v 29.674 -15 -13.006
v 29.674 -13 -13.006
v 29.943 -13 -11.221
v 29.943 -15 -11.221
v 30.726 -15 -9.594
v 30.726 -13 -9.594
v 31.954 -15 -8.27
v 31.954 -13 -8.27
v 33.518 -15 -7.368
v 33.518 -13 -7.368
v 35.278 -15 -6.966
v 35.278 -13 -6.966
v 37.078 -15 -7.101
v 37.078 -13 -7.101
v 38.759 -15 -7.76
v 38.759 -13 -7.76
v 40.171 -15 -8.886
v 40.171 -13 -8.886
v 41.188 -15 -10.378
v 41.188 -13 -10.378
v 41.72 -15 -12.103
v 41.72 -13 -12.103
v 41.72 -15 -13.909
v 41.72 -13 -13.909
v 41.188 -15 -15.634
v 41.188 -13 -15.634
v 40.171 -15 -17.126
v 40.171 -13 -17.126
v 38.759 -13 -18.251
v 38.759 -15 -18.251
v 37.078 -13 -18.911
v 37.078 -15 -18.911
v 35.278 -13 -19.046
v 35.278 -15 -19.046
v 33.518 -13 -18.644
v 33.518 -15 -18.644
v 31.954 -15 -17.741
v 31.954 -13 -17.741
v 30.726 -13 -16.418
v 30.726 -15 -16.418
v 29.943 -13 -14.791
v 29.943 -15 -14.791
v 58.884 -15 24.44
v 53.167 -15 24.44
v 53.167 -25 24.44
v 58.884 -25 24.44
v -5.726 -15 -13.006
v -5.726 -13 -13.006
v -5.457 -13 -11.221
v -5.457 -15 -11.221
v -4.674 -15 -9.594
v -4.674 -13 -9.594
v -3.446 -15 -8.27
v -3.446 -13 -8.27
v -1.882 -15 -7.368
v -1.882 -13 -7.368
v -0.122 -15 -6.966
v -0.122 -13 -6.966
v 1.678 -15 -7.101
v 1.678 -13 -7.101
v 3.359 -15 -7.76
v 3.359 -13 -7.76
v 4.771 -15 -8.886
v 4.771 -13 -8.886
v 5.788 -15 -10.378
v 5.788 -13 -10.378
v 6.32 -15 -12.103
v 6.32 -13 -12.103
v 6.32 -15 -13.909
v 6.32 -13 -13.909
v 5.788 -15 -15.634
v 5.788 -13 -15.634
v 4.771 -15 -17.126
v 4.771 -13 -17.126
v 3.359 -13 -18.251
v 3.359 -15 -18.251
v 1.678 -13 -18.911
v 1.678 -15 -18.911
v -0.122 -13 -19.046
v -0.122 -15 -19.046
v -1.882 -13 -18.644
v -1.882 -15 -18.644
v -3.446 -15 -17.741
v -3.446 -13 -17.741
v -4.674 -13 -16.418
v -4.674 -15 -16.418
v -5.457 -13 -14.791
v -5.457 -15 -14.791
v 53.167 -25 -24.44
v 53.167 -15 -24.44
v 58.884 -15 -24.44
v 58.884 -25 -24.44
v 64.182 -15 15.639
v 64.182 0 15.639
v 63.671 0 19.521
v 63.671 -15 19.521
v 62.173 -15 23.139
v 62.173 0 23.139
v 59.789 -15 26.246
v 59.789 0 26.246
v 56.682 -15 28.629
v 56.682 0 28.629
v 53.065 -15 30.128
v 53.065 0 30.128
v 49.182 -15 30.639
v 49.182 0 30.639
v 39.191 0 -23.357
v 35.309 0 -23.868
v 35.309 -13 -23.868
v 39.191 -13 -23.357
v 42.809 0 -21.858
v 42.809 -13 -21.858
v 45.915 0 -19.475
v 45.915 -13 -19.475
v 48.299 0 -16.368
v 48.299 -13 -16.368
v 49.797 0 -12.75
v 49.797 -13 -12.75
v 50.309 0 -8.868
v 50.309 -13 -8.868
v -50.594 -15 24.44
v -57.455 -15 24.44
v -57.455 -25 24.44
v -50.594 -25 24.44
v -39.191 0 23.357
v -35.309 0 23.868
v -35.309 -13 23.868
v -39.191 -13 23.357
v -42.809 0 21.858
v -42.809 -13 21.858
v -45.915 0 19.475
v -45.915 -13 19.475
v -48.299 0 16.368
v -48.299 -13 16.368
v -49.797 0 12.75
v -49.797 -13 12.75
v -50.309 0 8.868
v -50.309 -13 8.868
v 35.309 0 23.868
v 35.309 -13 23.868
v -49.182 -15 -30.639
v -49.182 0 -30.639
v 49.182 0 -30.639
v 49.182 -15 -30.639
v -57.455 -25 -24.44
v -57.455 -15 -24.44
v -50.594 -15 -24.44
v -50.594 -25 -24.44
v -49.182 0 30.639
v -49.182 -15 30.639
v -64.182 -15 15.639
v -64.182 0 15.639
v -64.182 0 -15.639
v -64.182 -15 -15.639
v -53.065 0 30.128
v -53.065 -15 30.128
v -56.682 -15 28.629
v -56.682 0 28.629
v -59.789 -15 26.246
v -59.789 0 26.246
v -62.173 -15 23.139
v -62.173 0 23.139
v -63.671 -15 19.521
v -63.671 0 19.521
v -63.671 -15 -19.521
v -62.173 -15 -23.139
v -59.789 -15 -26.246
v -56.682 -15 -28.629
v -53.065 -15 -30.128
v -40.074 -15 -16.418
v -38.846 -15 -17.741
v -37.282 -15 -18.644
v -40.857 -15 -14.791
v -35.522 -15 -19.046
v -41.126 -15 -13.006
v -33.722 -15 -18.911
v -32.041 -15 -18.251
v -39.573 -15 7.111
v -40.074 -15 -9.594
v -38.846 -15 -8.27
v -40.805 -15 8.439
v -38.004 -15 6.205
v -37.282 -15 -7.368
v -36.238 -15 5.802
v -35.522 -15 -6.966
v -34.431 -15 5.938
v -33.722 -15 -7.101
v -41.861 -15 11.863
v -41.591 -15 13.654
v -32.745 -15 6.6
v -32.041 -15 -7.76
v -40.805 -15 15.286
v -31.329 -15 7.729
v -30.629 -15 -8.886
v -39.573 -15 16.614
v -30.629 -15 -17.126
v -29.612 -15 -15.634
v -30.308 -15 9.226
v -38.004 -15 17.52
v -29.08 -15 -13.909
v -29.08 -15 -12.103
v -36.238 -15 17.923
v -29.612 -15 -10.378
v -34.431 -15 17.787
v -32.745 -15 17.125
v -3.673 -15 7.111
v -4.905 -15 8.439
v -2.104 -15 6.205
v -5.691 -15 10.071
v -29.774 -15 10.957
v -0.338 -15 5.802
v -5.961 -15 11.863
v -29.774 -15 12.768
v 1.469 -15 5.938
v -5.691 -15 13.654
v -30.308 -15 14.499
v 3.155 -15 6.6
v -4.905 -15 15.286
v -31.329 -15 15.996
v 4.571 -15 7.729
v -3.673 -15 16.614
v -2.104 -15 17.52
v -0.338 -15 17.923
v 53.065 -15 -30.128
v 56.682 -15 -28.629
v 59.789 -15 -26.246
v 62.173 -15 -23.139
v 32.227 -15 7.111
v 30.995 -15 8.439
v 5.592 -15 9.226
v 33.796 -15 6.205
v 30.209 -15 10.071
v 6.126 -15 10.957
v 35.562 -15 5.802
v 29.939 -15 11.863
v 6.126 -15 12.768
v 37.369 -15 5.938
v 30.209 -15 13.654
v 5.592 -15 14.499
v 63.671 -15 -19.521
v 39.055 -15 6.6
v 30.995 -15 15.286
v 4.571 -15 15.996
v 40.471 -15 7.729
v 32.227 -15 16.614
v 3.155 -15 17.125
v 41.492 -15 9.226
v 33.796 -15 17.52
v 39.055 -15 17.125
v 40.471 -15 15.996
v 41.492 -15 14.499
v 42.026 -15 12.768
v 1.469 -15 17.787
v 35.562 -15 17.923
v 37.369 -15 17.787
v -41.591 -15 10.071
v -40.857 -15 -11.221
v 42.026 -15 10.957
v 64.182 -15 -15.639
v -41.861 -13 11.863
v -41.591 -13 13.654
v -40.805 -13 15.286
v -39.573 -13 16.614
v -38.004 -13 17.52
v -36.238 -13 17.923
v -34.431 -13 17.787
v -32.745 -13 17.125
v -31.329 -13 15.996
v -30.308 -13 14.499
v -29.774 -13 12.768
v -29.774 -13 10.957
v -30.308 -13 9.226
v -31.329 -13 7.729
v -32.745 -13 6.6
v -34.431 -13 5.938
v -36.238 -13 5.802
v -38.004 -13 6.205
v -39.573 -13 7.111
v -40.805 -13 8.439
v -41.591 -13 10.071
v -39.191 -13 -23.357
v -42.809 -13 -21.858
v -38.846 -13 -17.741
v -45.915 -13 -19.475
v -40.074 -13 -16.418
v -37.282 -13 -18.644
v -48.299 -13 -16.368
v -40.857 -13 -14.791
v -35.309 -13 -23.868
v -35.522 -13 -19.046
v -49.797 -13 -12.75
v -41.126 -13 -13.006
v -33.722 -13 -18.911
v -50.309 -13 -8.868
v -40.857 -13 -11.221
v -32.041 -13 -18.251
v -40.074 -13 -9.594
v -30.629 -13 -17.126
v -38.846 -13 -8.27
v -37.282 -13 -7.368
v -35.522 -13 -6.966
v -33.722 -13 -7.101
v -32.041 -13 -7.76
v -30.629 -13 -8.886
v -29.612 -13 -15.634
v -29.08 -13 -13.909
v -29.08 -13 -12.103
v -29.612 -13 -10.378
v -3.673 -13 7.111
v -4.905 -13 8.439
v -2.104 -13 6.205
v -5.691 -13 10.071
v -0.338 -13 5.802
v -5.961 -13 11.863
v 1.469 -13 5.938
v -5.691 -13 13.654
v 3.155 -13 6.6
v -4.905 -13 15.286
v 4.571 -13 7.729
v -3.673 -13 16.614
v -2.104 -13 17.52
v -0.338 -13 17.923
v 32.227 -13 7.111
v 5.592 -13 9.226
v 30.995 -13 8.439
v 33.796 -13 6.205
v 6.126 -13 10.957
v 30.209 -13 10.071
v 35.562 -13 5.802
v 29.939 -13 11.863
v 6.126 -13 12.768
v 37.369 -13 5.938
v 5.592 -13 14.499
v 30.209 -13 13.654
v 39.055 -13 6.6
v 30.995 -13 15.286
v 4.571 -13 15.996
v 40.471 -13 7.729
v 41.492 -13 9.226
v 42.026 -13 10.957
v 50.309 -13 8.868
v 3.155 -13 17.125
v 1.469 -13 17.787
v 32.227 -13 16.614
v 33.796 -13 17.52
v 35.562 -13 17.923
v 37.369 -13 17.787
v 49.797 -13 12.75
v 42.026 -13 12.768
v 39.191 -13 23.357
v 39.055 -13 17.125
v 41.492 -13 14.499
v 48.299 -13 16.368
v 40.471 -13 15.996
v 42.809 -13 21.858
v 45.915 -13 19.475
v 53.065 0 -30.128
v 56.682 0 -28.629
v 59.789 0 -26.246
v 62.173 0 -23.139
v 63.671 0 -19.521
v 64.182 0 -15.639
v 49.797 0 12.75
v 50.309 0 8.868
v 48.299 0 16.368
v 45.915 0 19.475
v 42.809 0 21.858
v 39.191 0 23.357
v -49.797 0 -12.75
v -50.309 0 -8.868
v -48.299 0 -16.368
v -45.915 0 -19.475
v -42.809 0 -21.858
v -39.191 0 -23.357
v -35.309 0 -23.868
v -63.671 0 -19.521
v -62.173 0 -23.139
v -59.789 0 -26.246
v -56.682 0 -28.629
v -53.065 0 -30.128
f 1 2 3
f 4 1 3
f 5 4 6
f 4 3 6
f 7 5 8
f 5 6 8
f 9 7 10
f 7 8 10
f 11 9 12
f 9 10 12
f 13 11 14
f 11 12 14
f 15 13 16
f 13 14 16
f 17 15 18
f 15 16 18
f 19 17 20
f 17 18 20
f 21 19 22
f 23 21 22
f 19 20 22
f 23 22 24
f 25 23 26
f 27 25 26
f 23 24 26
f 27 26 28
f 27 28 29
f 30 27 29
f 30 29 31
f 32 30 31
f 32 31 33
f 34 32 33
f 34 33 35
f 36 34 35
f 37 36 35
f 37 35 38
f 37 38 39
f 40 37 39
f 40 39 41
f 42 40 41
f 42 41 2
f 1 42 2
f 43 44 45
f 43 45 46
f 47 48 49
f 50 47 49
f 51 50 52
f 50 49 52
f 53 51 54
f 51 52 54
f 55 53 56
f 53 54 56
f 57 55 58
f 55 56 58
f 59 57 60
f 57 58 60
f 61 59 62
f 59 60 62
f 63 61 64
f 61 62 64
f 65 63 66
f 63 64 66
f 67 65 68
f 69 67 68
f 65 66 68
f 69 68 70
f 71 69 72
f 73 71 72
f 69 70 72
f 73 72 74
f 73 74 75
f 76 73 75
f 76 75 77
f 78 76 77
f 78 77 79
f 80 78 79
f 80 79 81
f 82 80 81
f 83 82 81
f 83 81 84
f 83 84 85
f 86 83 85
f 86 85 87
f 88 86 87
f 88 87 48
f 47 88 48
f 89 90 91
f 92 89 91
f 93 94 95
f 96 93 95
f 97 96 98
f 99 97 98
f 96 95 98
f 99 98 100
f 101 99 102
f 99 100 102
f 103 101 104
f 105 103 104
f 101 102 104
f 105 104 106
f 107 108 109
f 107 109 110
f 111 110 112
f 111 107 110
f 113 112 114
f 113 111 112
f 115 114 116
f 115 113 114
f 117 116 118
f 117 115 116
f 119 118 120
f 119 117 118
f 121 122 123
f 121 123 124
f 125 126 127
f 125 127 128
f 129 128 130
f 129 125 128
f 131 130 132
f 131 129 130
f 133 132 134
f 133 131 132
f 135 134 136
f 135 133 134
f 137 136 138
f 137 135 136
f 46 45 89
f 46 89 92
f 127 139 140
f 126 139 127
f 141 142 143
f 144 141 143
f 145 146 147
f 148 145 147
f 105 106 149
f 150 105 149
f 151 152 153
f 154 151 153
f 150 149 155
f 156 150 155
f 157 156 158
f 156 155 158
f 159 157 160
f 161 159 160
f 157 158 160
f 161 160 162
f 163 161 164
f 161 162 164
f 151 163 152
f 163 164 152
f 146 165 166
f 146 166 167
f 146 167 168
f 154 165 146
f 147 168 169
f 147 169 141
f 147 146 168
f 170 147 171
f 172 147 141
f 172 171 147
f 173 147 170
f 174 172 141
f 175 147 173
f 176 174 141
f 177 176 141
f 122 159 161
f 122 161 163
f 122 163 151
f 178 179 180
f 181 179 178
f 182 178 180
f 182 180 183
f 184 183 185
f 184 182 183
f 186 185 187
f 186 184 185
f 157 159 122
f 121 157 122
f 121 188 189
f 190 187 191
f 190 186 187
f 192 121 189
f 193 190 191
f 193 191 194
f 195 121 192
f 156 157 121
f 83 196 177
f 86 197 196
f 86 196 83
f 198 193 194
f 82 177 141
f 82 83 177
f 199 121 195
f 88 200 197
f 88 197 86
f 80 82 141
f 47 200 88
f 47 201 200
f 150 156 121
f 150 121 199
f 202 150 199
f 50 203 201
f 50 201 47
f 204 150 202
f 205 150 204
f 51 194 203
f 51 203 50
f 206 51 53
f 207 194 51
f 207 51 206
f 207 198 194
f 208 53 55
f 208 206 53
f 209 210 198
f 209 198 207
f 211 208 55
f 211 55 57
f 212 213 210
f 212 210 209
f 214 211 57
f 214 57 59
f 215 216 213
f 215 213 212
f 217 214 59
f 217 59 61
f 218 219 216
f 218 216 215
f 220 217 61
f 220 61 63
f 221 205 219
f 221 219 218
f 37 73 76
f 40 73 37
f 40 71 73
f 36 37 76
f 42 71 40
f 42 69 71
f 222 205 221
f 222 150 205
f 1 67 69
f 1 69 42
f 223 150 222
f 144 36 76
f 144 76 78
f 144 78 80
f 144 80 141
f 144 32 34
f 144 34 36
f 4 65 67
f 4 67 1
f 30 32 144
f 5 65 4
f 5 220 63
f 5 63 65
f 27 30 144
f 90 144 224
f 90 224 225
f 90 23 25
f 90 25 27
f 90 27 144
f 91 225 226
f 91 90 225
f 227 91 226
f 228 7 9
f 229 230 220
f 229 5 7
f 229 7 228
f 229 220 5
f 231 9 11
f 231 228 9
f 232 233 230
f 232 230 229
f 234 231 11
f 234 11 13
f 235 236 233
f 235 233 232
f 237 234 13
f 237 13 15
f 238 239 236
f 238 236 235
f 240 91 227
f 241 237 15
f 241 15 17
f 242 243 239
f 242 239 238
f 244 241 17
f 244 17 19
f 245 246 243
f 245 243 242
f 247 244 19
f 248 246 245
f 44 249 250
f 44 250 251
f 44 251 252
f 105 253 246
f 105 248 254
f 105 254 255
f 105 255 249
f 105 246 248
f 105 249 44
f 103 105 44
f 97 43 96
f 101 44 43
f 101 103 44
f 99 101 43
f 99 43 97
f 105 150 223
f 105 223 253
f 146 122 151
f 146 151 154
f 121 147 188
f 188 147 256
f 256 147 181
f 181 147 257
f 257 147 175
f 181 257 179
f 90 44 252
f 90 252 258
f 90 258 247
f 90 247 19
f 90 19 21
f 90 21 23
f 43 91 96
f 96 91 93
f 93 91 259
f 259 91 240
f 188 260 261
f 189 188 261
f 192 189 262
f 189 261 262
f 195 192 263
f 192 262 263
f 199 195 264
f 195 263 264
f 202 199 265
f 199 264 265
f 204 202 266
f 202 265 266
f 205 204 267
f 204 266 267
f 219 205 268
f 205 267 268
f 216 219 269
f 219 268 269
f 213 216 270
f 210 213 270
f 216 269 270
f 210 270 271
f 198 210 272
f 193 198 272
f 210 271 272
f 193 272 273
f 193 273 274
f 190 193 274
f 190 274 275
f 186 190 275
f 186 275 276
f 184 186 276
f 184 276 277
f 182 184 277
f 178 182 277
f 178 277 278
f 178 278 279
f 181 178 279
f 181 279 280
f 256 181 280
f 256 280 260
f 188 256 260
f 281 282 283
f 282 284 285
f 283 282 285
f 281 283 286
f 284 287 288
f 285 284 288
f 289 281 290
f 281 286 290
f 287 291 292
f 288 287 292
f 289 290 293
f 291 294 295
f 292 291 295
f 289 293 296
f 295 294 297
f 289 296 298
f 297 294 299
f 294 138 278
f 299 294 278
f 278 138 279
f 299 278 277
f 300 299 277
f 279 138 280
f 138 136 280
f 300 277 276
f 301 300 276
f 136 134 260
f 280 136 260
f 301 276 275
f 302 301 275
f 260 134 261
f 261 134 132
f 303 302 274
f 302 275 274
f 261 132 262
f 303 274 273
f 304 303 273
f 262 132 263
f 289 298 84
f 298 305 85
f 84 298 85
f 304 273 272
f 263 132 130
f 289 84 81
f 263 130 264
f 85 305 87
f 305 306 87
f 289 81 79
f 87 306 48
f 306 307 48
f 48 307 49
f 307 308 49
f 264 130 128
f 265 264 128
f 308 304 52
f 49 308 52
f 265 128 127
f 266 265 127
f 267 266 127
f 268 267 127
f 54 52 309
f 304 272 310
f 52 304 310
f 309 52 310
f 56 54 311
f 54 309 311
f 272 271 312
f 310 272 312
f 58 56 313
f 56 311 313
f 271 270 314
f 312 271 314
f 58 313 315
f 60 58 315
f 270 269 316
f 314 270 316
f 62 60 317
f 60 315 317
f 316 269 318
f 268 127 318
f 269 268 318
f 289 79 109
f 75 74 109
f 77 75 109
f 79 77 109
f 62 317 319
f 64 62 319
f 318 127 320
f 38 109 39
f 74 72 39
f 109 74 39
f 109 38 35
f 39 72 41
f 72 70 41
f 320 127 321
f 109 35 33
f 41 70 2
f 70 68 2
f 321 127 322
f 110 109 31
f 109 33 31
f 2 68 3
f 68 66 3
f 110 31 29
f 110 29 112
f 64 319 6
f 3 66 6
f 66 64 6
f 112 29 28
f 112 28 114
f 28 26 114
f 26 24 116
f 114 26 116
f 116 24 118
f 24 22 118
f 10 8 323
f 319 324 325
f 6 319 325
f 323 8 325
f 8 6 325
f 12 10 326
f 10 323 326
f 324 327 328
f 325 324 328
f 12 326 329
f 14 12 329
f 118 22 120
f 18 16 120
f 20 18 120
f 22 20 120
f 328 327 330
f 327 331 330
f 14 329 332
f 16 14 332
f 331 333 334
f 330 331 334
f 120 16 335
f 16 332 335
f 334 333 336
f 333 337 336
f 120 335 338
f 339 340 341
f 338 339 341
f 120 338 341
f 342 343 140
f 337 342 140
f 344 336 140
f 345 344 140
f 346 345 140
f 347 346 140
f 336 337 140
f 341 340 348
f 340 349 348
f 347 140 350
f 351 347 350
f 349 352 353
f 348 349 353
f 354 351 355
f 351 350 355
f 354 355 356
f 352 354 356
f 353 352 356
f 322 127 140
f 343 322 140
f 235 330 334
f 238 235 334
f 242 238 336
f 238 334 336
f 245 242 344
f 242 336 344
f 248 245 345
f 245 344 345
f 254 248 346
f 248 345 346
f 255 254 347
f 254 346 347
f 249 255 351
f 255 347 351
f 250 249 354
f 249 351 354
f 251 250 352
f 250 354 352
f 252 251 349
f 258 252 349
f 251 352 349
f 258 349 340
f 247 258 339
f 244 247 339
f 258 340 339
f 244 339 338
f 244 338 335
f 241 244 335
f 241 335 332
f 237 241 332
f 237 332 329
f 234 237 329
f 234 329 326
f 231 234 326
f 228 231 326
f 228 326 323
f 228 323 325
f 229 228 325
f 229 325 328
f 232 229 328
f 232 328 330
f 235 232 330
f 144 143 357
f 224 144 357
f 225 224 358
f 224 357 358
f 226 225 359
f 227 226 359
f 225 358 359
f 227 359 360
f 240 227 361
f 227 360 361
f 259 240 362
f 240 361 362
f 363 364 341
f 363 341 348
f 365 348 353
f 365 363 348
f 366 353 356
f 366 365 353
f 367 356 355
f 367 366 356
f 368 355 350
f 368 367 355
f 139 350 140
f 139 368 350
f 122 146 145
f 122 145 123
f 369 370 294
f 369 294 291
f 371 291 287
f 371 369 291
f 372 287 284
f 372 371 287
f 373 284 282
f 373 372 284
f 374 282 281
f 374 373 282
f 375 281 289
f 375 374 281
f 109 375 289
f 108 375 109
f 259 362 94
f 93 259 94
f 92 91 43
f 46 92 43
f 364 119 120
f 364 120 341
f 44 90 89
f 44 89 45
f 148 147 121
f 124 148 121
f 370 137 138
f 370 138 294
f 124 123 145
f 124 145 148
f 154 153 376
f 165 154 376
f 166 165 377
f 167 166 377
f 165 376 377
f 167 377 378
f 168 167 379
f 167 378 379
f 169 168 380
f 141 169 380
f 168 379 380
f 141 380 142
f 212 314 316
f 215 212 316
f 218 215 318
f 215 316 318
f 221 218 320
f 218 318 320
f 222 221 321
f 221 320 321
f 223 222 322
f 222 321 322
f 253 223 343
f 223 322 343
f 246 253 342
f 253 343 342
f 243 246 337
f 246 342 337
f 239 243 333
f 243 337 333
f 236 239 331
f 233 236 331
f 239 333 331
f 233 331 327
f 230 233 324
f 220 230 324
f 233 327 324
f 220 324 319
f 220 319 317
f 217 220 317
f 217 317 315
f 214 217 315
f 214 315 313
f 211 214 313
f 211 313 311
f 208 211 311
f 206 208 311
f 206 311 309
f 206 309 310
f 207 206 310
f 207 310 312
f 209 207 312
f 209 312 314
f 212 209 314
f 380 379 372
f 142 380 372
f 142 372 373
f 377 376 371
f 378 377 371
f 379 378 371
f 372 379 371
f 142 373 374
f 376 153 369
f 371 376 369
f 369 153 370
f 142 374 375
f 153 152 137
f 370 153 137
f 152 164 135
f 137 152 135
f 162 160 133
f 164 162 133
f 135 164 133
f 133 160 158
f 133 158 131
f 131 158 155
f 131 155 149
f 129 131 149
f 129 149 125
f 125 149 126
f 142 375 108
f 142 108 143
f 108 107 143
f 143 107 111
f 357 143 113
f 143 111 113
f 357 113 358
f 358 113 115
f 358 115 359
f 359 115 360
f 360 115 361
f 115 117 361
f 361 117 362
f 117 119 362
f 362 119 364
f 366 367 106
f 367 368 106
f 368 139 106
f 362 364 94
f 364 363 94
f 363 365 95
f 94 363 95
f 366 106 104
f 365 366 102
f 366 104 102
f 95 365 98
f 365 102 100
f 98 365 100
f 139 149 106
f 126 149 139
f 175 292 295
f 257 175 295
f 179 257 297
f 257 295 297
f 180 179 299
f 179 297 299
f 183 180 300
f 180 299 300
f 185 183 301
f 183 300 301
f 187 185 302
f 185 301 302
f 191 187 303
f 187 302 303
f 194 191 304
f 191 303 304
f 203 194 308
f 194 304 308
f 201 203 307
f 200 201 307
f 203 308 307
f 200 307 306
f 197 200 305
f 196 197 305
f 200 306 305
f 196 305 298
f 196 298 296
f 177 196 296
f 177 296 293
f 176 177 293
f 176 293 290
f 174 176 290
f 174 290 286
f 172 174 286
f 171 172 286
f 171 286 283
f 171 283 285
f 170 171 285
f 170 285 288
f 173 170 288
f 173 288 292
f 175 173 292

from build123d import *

# Parameters (mm, degrees)
F1_DEPTH = 15
F3_DEPTH = 13
F4_R     = 6.077125
F4_R_2   = 6.056925
F5_DEPTH = 2.001
F6_W     = 6.860256
F6_H     = 48.87931
F6_W_2   = 5.716875
F7_DEPTH = 25


with BuildPart() as f1:
    # F0 (on Front) → F1 (new body)
    with BuildSketch(Plane.XZ):
        with BuildLine():
            ThreePointArc((-64.182252, -15.639039), (-59.788853, -26.245641), (-49.182252, -30.639039))
            Line((-49.182252, -30.639039), (49.182252, -30.639039))
            ThreePointArc((49.182252, -30.639039), (59.788853, -26.245641), (64.182252, -15.639039))
            Line((64.182252, -15.639039), (64.182252, 15.639039))
            ThreePointArc((64.182252, 15.639039), (59.788853, 26.245641), (49.182252, 30.639039))
            Line((49.182252, 30.639039), (-49.182252, 30.639039))
            ThreePointArc((-49.182252, 30.639039), (-59.788853, 26.245641), (-64.182252, 15.639039))
            Line((-64.182252, 15.639039), (-64.182252, -15.639039))
        make_face()
    extrude(amount=F1_DEPTH)

    # F2 (on Front) → F3 (cut)
    with BuildSketch(Plane.XZ):
        with BuildLine():
            ThreePointArc((-50.308529, -8.867968), (-45.915131, -19.47457), (-35.308529, -23.867968))
            Line((-35.308529, -23.867968), (35.308529, -23.867968))
            ThreePointArc((35.308529, -23.867968), (45.915131, -19.47457), (50.308529, -8.867968))
            Line((50.308529, -8.867968), (50.308529, 8.867968))
            ThreePointArc((50.308529, 8.867968), (45.915131, 19.47457), (35.308529, 23.867968))
            Line((35.308529, 23.867968), (-35.308529, 23.867968))
            ThreePointArc((-35.308529, 23.867968), (-45.915131, 19.47457), (-50.308529, 8.867968))
            Line((-50.308529, 8.867968), (-50.308529, -8.867968))
        make_face()
    extrude(amount=F3_DEPTH, mode=Mode.SUBTRACT)

    # F4 (on face) → F5 (cut, through all)
    with BuildSketch(Plane(origin=(0, -13, 0), x_dir=(-1, 0, 0), z_dir=(0, 1, 0))):
        with Locations((-36.016334, 11.862524)):
            Circle(F4_R)
        with Locations((-0.116334, 11.862524)):
            Circle(F4_R)
        with Locations((35.783666, 11.862524)):
            Circle(F4_R)
        with Locations((-35.730492, -13.005898)):
            Circle(F4_R_2)
        with Locations((-0.330492, -13.005898)):
            Circle(F4_R_2)
        with Locations((35.069508, -13.005898)):
            Circle(F4_R_2)
    extrude(amount=-F5_DEPTH, mode=Mode.SUBTRACT)

    # F6 (on Front) → F7 (join)
    with BuildSketch(Plane.XZ):
        with Locations((-54.024503, 0)):
            Rectangle(F6_W, F6_H)
        with Locations((56.025408, 0)):
            Rectangle(F6_W_2, F6_H)
    extrude(amount=F7_DEPTH)


solid = f1.part
